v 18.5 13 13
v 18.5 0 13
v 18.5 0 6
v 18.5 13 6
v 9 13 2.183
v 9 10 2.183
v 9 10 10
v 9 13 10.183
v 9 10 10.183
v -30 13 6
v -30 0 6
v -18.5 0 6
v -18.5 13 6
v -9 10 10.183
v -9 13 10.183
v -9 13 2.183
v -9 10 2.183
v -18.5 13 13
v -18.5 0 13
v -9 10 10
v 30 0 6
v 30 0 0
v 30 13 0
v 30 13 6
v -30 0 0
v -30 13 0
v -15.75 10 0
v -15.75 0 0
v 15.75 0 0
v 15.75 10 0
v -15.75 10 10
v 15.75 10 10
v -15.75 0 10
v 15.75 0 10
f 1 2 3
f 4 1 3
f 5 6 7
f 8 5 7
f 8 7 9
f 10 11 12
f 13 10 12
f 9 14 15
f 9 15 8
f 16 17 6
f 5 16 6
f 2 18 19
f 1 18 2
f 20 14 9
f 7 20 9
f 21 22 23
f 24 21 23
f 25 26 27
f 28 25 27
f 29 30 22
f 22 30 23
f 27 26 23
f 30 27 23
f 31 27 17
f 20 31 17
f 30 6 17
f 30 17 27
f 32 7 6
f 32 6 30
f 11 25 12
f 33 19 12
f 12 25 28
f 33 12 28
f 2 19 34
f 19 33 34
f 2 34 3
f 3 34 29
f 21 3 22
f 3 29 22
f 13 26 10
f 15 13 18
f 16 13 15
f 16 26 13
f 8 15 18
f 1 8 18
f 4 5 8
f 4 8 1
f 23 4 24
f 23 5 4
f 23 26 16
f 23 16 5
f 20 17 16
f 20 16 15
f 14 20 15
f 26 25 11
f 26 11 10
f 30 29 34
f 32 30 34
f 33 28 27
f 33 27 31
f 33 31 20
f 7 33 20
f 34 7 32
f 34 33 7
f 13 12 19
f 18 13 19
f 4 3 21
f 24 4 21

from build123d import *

# Parameters (mm, degrees)
SKETCH_W        = 60
SKETCH_H        = 13
PAD_DEPTH       = 13
POCKET_DEPTH    = 16
SKETCH002_W     = 31.5
SKETCH002_H     = 18.692561
POCKET001_DEPTH = 10
SKETCH003_W     = 18
SKETCH003_H     = 8
POCKET002_DEPTH = 5


with BuildPart() as part:
    # Sketch → Pad (new body)
    with BuildSketch(Plane.XY):
        with Locations((0, 6.5)):
            Rectangle(SKETCH_W, SKETCH_H)
    extrude(amount=PAD_DEPTH)

    # Sketch001 (on Face3 of Pad) → Pocket (cut)
    with BuildSketch(Plane.XZ):
        Polygon((-33.208946, 6), (-18.5, 6), (-18.5, 16.342094), (18.5, 16.342094), (18.5, 6), (35.755672, 6), (31.923449, 22.090439), (-34.230431, 22.090439), align=None)
    extrude(amount=-POCKET_DEPTH, mode=Mode.SUBTRACT)

    # Sketch002 (on Face10 of Pocket) → Pocket001 (cut)
    with BuildSketch(Plane.XZ):
        with Locations((0, 0.65372)):
            Rectangle(SKETCH002_W, SKETCH002_H)
    extrude(amount=-POCKET001_DEPTH, mode=Mode.SUBTRACT)

    # Sketch003 (on Face12 of Pocket001) → Pocket002 (cut)
    with BuildSketch(Plane.XZ.offset(-10)):
        with Locations((0, 6.183331)):
            Rectangle(SKETCH003_W, SKETCH003_H)
    extrude(amount=-POCKET002_DEPTH, mode=Mode.SUBTRACT)


solid = part.part
